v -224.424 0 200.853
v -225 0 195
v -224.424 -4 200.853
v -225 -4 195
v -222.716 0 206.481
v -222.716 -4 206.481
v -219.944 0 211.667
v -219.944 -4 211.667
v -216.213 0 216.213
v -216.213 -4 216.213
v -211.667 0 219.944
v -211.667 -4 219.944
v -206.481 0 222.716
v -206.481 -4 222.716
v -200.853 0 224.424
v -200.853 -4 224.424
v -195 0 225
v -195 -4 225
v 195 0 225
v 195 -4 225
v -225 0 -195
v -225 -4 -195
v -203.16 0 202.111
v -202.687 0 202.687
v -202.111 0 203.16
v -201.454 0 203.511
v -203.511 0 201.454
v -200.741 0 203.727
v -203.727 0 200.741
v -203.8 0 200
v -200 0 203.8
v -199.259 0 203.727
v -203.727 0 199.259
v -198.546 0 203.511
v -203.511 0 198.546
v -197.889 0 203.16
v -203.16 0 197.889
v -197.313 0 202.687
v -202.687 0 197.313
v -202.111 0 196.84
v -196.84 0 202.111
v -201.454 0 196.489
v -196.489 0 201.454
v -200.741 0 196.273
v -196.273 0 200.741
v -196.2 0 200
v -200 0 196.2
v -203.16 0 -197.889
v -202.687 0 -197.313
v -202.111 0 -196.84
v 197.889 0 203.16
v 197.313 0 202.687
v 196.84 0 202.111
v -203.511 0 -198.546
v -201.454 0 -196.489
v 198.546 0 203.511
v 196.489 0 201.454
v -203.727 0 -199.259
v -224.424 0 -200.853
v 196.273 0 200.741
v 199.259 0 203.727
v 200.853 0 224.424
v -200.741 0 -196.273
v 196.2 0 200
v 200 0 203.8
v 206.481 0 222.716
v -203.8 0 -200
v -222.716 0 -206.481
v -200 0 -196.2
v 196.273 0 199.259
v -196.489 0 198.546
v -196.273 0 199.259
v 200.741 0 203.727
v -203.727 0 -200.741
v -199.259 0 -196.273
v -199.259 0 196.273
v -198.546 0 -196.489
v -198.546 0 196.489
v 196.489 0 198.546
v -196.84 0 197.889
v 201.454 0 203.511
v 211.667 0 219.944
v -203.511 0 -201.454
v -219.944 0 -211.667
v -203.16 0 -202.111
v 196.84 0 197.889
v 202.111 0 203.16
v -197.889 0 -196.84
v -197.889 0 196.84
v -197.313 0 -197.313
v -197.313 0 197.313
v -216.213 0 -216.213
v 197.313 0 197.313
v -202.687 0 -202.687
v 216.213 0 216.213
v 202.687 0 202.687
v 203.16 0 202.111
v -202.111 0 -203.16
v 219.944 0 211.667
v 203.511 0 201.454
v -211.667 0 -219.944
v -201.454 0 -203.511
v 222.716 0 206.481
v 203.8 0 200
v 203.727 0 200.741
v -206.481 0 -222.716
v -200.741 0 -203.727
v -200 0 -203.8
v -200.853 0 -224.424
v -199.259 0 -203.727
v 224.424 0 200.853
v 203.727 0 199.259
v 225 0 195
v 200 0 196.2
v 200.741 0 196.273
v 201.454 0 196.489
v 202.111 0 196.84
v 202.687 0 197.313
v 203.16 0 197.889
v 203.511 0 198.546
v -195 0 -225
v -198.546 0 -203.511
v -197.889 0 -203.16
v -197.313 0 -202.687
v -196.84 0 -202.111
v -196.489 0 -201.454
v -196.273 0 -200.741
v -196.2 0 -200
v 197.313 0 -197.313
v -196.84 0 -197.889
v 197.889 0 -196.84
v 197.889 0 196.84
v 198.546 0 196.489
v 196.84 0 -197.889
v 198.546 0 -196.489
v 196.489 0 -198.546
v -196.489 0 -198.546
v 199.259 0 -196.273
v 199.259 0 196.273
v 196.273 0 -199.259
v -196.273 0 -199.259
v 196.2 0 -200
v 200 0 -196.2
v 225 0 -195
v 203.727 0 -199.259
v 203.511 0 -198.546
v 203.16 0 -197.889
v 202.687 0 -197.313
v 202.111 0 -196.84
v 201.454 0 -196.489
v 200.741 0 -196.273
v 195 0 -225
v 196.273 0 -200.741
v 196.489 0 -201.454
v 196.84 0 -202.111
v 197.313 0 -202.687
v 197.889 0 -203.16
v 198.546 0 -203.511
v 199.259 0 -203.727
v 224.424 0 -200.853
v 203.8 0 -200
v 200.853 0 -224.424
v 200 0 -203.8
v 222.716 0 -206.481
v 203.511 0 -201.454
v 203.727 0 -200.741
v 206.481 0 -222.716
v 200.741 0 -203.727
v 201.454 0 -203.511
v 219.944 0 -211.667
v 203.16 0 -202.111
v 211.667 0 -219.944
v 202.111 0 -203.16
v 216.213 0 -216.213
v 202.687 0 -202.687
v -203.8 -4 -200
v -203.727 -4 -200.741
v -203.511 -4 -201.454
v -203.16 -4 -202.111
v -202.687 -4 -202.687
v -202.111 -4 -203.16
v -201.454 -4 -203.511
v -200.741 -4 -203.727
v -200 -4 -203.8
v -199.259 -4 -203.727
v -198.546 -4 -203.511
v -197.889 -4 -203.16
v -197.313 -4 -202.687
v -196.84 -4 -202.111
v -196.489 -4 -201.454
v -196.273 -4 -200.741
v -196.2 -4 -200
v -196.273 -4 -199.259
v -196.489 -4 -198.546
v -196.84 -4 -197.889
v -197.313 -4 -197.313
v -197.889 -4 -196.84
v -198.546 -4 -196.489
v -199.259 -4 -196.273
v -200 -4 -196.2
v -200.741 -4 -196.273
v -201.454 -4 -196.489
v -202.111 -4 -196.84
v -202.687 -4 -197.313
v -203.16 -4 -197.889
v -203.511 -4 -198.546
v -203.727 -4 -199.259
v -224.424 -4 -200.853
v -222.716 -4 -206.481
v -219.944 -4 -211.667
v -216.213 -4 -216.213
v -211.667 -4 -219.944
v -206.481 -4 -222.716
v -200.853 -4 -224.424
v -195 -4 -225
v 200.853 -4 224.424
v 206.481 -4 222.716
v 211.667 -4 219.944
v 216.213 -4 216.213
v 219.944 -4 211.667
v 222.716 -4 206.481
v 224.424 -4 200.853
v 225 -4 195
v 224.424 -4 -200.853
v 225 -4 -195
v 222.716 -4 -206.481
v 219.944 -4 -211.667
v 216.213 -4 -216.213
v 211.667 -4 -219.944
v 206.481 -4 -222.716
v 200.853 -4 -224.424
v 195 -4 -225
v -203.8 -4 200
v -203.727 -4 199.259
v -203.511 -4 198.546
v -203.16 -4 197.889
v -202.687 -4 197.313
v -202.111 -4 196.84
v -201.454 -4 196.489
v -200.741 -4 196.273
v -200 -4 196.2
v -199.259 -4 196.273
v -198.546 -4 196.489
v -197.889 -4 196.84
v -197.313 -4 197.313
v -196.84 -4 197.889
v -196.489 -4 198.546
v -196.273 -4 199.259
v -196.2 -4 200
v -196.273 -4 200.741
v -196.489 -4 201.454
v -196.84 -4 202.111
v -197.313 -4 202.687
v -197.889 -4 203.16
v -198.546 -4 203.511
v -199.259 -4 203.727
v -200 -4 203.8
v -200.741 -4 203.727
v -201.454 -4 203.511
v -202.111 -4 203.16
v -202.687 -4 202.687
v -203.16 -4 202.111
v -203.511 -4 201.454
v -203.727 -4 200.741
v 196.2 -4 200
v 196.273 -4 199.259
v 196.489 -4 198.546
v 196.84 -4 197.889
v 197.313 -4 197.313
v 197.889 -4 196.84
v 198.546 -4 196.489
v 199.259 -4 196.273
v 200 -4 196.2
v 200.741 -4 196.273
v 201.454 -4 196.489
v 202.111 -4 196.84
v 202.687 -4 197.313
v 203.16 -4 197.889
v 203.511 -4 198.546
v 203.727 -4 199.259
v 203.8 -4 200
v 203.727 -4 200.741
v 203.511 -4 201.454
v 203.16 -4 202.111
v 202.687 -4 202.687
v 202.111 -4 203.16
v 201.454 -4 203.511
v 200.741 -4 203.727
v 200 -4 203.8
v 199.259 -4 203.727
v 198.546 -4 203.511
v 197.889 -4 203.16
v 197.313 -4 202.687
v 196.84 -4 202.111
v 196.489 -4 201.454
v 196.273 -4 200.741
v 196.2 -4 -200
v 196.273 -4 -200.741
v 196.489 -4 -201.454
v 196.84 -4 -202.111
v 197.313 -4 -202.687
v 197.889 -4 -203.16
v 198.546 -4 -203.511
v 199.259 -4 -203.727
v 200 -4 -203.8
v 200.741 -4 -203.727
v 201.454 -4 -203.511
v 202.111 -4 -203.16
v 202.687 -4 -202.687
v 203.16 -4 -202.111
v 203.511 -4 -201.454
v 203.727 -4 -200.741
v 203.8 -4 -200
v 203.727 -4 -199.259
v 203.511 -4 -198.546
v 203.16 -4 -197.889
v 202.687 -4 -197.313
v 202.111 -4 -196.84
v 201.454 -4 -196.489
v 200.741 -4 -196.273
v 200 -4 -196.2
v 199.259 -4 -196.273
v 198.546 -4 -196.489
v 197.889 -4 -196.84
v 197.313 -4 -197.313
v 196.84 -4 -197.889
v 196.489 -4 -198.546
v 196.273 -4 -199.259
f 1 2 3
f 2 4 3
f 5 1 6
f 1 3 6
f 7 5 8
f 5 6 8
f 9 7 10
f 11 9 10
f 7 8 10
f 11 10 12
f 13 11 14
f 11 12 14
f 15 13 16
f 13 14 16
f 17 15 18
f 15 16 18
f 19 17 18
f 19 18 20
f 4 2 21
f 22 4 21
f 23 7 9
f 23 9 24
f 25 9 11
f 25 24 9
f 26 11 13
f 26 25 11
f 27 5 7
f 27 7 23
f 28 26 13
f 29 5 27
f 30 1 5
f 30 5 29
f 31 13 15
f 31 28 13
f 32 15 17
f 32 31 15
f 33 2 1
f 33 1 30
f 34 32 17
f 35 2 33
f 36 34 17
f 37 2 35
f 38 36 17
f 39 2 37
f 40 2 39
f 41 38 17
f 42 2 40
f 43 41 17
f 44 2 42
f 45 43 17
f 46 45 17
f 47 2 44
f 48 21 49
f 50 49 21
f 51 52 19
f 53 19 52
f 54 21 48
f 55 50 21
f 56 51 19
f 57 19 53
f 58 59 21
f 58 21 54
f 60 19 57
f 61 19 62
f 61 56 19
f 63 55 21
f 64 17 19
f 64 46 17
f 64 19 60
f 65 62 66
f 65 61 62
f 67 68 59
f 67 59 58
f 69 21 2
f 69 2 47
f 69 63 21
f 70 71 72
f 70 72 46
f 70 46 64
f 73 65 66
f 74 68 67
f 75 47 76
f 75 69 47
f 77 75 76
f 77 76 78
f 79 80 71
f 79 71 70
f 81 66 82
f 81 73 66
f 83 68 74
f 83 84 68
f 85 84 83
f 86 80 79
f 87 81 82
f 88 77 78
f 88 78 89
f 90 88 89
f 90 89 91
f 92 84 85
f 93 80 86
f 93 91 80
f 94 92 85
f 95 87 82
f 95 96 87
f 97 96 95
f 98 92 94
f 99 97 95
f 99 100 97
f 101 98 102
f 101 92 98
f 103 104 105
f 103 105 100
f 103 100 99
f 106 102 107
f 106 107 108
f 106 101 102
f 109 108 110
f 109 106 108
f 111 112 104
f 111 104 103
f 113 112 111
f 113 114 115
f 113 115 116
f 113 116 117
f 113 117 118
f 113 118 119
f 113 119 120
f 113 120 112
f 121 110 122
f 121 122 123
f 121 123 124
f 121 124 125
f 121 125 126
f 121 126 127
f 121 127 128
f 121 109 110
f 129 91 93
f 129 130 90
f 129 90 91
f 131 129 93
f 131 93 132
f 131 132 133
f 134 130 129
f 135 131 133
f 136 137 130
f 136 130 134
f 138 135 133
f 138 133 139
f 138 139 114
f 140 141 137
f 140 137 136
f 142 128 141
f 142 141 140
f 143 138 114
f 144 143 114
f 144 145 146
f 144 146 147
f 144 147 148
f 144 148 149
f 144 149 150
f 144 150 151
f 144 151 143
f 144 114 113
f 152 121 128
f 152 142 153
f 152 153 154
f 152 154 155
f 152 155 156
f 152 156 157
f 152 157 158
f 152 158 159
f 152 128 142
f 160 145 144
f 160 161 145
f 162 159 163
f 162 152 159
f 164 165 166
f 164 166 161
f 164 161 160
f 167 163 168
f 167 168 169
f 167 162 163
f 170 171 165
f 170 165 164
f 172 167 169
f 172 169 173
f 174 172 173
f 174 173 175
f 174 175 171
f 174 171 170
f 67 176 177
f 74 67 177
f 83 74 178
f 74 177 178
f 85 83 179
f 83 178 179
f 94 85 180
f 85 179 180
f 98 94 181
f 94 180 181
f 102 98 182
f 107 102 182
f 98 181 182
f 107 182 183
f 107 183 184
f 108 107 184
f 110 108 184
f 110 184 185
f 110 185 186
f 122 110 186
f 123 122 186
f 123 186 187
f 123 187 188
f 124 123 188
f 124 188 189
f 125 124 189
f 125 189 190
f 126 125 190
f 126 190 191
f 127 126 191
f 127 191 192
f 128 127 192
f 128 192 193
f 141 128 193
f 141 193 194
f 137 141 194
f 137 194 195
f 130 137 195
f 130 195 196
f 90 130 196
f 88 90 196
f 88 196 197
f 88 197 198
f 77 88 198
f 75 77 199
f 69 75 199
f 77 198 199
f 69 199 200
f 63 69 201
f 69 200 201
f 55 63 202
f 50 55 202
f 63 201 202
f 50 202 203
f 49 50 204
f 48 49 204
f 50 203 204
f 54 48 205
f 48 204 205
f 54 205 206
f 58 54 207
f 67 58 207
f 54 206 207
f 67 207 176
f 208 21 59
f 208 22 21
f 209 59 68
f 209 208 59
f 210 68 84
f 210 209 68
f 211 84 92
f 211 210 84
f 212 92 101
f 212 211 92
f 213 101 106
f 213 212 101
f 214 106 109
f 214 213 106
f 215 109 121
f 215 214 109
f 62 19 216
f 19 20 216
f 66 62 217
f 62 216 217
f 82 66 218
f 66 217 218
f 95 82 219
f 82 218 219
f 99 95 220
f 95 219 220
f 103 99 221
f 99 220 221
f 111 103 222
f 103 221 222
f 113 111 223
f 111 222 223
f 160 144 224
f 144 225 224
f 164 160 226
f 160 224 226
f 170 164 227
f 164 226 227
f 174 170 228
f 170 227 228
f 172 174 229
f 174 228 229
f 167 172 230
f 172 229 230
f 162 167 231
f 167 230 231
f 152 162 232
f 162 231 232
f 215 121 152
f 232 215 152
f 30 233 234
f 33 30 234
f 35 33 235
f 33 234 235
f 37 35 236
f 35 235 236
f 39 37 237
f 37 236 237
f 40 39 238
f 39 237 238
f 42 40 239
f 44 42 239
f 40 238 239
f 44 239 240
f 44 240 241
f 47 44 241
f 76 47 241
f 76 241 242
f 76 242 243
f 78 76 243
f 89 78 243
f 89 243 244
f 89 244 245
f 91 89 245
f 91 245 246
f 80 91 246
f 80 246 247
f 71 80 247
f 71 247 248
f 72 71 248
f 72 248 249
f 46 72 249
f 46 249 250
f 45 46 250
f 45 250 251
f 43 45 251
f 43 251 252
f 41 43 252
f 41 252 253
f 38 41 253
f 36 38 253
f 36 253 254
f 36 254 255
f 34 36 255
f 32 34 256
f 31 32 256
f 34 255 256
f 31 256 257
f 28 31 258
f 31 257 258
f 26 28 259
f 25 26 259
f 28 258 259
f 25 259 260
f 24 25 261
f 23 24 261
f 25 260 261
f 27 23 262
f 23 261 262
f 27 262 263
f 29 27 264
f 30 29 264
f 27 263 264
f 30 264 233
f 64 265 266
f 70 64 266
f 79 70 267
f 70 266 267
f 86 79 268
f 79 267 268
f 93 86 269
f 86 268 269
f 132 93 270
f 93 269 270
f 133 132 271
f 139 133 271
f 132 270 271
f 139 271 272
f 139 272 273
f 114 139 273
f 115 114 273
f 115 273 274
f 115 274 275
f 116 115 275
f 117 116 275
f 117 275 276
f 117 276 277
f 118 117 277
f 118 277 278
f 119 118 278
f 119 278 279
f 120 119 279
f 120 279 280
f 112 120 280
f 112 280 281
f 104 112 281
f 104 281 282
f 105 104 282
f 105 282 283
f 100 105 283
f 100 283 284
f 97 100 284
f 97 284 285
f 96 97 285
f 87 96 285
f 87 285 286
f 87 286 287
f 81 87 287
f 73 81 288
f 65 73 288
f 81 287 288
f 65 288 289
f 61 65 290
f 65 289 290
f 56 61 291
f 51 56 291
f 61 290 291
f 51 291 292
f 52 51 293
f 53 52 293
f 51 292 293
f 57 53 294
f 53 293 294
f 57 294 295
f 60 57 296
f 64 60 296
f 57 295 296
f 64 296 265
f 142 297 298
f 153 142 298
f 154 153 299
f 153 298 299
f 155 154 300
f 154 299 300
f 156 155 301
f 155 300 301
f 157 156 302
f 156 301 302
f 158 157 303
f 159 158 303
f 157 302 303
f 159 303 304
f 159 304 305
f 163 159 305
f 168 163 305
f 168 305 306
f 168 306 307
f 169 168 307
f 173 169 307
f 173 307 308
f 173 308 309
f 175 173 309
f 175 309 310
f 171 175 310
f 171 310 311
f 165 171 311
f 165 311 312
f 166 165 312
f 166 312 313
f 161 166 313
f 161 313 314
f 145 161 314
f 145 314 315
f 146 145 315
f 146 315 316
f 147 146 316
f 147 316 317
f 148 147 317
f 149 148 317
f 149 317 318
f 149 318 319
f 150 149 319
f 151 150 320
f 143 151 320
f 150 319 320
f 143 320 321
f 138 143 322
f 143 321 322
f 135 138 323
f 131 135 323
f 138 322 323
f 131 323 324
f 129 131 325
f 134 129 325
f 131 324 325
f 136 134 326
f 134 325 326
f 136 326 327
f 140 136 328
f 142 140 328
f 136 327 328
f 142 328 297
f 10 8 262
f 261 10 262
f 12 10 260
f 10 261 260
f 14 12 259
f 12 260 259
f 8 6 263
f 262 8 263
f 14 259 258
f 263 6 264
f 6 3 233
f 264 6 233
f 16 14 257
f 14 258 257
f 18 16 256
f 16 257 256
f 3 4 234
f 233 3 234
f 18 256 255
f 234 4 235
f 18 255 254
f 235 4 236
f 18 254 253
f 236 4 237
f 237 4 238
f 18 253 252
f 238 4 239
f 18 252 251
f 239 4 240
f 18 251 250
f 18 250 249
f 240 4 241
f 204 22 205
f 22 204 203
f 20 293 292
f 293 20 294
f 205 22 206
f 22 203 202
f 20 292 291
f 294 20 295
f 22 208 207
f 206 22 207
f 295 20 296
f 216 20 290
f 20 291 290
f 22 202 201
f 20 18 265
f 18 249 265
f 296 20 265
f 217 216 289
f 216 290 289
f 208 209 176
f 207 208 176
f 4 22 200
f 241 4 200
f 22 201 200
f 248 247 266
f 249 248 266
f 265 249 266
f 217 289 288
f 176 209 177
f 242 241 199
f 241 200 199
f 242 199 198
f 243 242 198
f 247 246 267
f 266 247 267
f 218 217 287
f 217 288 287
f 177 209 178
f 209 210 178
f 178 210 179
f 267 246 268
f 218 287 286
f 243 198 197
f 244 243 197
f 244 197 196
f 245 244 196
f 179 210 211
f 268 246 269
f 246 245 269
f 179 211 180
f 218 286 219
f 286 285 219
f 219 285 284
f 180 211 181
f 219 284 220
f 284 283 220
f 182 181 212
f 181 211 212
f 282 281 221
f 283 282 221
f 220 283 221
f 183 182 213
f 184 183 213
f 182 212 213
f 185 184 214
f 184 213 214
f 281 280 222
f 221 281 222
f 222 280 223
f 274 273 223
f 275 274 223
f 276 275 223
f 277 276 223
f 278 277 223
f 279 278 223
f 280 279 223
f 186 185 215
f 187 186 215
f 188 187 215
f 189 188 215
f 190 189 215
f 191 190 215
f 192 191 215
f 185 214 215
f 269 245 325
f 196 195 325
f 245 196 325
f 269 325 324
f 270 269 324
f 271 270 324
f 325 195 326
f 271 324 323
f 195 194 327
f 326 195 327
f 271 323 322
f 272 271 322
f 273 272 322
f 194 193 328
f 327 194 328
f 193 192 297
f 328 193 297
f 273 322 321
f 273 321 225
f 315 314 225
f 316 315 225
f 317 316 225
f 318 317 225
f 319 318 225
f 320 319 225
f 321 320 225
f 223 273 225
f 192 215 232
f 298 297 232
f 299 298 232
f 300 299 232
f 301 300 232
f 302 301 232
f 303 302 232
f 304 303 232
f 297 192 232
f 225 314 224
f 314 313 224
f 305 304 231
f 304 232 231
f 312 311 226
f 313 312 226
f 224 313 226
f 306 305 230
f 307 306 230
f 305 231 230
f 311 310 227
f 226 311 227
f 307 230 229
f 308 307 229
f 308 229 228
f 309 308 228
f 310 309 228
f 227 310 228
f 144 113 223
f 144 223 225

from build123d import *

# Parameters (mm, degrees)
SKETCH1_W            = 450
SKETCH1_H            = 450
BASE_FLANGE1_DEPTH   = 4
FILLET1_R            = 30
M7_CLEARANCE_HOLE1_D = 7.6


# Sheet-metal steps are written as plain solids
with BuildPart() as part:
    # Sketch1 → Base-Flange1 (new body)
    with BuildSketch(Plane(origin=(0, 0, 0), x_dir=(1, 0, 0), z_dir=(0, 1, 0))):
        Rectangle(SKETCH1_W, SKETCH1_H)
    extrude(amount=-BASE_FLANGE1_DEPTH)

    # Fillet1
    fillet1_edges = [part.edges().sort_by_distance(p)[0] for p in [
        (225, -2, 225),
        (-225, -2, 225),
        (-225, -2, -225),
        (225, -2, -225),
    ]]
    fillet(fillet1_edges, radius=FILLET1_R)

    # M7 Clearance Hole1 (through all)
    with Locations(Plane(origin=(0, 0, 0), x_dir=(1, 0, 0), z_dir=(0, 1, 0))):
        with Locations((200, 200), (-200, -200), (-200, 200), (200, -200)):
            Hole(M7_CLEARANCE_HOLE1_D / 2)


solid = part.part
